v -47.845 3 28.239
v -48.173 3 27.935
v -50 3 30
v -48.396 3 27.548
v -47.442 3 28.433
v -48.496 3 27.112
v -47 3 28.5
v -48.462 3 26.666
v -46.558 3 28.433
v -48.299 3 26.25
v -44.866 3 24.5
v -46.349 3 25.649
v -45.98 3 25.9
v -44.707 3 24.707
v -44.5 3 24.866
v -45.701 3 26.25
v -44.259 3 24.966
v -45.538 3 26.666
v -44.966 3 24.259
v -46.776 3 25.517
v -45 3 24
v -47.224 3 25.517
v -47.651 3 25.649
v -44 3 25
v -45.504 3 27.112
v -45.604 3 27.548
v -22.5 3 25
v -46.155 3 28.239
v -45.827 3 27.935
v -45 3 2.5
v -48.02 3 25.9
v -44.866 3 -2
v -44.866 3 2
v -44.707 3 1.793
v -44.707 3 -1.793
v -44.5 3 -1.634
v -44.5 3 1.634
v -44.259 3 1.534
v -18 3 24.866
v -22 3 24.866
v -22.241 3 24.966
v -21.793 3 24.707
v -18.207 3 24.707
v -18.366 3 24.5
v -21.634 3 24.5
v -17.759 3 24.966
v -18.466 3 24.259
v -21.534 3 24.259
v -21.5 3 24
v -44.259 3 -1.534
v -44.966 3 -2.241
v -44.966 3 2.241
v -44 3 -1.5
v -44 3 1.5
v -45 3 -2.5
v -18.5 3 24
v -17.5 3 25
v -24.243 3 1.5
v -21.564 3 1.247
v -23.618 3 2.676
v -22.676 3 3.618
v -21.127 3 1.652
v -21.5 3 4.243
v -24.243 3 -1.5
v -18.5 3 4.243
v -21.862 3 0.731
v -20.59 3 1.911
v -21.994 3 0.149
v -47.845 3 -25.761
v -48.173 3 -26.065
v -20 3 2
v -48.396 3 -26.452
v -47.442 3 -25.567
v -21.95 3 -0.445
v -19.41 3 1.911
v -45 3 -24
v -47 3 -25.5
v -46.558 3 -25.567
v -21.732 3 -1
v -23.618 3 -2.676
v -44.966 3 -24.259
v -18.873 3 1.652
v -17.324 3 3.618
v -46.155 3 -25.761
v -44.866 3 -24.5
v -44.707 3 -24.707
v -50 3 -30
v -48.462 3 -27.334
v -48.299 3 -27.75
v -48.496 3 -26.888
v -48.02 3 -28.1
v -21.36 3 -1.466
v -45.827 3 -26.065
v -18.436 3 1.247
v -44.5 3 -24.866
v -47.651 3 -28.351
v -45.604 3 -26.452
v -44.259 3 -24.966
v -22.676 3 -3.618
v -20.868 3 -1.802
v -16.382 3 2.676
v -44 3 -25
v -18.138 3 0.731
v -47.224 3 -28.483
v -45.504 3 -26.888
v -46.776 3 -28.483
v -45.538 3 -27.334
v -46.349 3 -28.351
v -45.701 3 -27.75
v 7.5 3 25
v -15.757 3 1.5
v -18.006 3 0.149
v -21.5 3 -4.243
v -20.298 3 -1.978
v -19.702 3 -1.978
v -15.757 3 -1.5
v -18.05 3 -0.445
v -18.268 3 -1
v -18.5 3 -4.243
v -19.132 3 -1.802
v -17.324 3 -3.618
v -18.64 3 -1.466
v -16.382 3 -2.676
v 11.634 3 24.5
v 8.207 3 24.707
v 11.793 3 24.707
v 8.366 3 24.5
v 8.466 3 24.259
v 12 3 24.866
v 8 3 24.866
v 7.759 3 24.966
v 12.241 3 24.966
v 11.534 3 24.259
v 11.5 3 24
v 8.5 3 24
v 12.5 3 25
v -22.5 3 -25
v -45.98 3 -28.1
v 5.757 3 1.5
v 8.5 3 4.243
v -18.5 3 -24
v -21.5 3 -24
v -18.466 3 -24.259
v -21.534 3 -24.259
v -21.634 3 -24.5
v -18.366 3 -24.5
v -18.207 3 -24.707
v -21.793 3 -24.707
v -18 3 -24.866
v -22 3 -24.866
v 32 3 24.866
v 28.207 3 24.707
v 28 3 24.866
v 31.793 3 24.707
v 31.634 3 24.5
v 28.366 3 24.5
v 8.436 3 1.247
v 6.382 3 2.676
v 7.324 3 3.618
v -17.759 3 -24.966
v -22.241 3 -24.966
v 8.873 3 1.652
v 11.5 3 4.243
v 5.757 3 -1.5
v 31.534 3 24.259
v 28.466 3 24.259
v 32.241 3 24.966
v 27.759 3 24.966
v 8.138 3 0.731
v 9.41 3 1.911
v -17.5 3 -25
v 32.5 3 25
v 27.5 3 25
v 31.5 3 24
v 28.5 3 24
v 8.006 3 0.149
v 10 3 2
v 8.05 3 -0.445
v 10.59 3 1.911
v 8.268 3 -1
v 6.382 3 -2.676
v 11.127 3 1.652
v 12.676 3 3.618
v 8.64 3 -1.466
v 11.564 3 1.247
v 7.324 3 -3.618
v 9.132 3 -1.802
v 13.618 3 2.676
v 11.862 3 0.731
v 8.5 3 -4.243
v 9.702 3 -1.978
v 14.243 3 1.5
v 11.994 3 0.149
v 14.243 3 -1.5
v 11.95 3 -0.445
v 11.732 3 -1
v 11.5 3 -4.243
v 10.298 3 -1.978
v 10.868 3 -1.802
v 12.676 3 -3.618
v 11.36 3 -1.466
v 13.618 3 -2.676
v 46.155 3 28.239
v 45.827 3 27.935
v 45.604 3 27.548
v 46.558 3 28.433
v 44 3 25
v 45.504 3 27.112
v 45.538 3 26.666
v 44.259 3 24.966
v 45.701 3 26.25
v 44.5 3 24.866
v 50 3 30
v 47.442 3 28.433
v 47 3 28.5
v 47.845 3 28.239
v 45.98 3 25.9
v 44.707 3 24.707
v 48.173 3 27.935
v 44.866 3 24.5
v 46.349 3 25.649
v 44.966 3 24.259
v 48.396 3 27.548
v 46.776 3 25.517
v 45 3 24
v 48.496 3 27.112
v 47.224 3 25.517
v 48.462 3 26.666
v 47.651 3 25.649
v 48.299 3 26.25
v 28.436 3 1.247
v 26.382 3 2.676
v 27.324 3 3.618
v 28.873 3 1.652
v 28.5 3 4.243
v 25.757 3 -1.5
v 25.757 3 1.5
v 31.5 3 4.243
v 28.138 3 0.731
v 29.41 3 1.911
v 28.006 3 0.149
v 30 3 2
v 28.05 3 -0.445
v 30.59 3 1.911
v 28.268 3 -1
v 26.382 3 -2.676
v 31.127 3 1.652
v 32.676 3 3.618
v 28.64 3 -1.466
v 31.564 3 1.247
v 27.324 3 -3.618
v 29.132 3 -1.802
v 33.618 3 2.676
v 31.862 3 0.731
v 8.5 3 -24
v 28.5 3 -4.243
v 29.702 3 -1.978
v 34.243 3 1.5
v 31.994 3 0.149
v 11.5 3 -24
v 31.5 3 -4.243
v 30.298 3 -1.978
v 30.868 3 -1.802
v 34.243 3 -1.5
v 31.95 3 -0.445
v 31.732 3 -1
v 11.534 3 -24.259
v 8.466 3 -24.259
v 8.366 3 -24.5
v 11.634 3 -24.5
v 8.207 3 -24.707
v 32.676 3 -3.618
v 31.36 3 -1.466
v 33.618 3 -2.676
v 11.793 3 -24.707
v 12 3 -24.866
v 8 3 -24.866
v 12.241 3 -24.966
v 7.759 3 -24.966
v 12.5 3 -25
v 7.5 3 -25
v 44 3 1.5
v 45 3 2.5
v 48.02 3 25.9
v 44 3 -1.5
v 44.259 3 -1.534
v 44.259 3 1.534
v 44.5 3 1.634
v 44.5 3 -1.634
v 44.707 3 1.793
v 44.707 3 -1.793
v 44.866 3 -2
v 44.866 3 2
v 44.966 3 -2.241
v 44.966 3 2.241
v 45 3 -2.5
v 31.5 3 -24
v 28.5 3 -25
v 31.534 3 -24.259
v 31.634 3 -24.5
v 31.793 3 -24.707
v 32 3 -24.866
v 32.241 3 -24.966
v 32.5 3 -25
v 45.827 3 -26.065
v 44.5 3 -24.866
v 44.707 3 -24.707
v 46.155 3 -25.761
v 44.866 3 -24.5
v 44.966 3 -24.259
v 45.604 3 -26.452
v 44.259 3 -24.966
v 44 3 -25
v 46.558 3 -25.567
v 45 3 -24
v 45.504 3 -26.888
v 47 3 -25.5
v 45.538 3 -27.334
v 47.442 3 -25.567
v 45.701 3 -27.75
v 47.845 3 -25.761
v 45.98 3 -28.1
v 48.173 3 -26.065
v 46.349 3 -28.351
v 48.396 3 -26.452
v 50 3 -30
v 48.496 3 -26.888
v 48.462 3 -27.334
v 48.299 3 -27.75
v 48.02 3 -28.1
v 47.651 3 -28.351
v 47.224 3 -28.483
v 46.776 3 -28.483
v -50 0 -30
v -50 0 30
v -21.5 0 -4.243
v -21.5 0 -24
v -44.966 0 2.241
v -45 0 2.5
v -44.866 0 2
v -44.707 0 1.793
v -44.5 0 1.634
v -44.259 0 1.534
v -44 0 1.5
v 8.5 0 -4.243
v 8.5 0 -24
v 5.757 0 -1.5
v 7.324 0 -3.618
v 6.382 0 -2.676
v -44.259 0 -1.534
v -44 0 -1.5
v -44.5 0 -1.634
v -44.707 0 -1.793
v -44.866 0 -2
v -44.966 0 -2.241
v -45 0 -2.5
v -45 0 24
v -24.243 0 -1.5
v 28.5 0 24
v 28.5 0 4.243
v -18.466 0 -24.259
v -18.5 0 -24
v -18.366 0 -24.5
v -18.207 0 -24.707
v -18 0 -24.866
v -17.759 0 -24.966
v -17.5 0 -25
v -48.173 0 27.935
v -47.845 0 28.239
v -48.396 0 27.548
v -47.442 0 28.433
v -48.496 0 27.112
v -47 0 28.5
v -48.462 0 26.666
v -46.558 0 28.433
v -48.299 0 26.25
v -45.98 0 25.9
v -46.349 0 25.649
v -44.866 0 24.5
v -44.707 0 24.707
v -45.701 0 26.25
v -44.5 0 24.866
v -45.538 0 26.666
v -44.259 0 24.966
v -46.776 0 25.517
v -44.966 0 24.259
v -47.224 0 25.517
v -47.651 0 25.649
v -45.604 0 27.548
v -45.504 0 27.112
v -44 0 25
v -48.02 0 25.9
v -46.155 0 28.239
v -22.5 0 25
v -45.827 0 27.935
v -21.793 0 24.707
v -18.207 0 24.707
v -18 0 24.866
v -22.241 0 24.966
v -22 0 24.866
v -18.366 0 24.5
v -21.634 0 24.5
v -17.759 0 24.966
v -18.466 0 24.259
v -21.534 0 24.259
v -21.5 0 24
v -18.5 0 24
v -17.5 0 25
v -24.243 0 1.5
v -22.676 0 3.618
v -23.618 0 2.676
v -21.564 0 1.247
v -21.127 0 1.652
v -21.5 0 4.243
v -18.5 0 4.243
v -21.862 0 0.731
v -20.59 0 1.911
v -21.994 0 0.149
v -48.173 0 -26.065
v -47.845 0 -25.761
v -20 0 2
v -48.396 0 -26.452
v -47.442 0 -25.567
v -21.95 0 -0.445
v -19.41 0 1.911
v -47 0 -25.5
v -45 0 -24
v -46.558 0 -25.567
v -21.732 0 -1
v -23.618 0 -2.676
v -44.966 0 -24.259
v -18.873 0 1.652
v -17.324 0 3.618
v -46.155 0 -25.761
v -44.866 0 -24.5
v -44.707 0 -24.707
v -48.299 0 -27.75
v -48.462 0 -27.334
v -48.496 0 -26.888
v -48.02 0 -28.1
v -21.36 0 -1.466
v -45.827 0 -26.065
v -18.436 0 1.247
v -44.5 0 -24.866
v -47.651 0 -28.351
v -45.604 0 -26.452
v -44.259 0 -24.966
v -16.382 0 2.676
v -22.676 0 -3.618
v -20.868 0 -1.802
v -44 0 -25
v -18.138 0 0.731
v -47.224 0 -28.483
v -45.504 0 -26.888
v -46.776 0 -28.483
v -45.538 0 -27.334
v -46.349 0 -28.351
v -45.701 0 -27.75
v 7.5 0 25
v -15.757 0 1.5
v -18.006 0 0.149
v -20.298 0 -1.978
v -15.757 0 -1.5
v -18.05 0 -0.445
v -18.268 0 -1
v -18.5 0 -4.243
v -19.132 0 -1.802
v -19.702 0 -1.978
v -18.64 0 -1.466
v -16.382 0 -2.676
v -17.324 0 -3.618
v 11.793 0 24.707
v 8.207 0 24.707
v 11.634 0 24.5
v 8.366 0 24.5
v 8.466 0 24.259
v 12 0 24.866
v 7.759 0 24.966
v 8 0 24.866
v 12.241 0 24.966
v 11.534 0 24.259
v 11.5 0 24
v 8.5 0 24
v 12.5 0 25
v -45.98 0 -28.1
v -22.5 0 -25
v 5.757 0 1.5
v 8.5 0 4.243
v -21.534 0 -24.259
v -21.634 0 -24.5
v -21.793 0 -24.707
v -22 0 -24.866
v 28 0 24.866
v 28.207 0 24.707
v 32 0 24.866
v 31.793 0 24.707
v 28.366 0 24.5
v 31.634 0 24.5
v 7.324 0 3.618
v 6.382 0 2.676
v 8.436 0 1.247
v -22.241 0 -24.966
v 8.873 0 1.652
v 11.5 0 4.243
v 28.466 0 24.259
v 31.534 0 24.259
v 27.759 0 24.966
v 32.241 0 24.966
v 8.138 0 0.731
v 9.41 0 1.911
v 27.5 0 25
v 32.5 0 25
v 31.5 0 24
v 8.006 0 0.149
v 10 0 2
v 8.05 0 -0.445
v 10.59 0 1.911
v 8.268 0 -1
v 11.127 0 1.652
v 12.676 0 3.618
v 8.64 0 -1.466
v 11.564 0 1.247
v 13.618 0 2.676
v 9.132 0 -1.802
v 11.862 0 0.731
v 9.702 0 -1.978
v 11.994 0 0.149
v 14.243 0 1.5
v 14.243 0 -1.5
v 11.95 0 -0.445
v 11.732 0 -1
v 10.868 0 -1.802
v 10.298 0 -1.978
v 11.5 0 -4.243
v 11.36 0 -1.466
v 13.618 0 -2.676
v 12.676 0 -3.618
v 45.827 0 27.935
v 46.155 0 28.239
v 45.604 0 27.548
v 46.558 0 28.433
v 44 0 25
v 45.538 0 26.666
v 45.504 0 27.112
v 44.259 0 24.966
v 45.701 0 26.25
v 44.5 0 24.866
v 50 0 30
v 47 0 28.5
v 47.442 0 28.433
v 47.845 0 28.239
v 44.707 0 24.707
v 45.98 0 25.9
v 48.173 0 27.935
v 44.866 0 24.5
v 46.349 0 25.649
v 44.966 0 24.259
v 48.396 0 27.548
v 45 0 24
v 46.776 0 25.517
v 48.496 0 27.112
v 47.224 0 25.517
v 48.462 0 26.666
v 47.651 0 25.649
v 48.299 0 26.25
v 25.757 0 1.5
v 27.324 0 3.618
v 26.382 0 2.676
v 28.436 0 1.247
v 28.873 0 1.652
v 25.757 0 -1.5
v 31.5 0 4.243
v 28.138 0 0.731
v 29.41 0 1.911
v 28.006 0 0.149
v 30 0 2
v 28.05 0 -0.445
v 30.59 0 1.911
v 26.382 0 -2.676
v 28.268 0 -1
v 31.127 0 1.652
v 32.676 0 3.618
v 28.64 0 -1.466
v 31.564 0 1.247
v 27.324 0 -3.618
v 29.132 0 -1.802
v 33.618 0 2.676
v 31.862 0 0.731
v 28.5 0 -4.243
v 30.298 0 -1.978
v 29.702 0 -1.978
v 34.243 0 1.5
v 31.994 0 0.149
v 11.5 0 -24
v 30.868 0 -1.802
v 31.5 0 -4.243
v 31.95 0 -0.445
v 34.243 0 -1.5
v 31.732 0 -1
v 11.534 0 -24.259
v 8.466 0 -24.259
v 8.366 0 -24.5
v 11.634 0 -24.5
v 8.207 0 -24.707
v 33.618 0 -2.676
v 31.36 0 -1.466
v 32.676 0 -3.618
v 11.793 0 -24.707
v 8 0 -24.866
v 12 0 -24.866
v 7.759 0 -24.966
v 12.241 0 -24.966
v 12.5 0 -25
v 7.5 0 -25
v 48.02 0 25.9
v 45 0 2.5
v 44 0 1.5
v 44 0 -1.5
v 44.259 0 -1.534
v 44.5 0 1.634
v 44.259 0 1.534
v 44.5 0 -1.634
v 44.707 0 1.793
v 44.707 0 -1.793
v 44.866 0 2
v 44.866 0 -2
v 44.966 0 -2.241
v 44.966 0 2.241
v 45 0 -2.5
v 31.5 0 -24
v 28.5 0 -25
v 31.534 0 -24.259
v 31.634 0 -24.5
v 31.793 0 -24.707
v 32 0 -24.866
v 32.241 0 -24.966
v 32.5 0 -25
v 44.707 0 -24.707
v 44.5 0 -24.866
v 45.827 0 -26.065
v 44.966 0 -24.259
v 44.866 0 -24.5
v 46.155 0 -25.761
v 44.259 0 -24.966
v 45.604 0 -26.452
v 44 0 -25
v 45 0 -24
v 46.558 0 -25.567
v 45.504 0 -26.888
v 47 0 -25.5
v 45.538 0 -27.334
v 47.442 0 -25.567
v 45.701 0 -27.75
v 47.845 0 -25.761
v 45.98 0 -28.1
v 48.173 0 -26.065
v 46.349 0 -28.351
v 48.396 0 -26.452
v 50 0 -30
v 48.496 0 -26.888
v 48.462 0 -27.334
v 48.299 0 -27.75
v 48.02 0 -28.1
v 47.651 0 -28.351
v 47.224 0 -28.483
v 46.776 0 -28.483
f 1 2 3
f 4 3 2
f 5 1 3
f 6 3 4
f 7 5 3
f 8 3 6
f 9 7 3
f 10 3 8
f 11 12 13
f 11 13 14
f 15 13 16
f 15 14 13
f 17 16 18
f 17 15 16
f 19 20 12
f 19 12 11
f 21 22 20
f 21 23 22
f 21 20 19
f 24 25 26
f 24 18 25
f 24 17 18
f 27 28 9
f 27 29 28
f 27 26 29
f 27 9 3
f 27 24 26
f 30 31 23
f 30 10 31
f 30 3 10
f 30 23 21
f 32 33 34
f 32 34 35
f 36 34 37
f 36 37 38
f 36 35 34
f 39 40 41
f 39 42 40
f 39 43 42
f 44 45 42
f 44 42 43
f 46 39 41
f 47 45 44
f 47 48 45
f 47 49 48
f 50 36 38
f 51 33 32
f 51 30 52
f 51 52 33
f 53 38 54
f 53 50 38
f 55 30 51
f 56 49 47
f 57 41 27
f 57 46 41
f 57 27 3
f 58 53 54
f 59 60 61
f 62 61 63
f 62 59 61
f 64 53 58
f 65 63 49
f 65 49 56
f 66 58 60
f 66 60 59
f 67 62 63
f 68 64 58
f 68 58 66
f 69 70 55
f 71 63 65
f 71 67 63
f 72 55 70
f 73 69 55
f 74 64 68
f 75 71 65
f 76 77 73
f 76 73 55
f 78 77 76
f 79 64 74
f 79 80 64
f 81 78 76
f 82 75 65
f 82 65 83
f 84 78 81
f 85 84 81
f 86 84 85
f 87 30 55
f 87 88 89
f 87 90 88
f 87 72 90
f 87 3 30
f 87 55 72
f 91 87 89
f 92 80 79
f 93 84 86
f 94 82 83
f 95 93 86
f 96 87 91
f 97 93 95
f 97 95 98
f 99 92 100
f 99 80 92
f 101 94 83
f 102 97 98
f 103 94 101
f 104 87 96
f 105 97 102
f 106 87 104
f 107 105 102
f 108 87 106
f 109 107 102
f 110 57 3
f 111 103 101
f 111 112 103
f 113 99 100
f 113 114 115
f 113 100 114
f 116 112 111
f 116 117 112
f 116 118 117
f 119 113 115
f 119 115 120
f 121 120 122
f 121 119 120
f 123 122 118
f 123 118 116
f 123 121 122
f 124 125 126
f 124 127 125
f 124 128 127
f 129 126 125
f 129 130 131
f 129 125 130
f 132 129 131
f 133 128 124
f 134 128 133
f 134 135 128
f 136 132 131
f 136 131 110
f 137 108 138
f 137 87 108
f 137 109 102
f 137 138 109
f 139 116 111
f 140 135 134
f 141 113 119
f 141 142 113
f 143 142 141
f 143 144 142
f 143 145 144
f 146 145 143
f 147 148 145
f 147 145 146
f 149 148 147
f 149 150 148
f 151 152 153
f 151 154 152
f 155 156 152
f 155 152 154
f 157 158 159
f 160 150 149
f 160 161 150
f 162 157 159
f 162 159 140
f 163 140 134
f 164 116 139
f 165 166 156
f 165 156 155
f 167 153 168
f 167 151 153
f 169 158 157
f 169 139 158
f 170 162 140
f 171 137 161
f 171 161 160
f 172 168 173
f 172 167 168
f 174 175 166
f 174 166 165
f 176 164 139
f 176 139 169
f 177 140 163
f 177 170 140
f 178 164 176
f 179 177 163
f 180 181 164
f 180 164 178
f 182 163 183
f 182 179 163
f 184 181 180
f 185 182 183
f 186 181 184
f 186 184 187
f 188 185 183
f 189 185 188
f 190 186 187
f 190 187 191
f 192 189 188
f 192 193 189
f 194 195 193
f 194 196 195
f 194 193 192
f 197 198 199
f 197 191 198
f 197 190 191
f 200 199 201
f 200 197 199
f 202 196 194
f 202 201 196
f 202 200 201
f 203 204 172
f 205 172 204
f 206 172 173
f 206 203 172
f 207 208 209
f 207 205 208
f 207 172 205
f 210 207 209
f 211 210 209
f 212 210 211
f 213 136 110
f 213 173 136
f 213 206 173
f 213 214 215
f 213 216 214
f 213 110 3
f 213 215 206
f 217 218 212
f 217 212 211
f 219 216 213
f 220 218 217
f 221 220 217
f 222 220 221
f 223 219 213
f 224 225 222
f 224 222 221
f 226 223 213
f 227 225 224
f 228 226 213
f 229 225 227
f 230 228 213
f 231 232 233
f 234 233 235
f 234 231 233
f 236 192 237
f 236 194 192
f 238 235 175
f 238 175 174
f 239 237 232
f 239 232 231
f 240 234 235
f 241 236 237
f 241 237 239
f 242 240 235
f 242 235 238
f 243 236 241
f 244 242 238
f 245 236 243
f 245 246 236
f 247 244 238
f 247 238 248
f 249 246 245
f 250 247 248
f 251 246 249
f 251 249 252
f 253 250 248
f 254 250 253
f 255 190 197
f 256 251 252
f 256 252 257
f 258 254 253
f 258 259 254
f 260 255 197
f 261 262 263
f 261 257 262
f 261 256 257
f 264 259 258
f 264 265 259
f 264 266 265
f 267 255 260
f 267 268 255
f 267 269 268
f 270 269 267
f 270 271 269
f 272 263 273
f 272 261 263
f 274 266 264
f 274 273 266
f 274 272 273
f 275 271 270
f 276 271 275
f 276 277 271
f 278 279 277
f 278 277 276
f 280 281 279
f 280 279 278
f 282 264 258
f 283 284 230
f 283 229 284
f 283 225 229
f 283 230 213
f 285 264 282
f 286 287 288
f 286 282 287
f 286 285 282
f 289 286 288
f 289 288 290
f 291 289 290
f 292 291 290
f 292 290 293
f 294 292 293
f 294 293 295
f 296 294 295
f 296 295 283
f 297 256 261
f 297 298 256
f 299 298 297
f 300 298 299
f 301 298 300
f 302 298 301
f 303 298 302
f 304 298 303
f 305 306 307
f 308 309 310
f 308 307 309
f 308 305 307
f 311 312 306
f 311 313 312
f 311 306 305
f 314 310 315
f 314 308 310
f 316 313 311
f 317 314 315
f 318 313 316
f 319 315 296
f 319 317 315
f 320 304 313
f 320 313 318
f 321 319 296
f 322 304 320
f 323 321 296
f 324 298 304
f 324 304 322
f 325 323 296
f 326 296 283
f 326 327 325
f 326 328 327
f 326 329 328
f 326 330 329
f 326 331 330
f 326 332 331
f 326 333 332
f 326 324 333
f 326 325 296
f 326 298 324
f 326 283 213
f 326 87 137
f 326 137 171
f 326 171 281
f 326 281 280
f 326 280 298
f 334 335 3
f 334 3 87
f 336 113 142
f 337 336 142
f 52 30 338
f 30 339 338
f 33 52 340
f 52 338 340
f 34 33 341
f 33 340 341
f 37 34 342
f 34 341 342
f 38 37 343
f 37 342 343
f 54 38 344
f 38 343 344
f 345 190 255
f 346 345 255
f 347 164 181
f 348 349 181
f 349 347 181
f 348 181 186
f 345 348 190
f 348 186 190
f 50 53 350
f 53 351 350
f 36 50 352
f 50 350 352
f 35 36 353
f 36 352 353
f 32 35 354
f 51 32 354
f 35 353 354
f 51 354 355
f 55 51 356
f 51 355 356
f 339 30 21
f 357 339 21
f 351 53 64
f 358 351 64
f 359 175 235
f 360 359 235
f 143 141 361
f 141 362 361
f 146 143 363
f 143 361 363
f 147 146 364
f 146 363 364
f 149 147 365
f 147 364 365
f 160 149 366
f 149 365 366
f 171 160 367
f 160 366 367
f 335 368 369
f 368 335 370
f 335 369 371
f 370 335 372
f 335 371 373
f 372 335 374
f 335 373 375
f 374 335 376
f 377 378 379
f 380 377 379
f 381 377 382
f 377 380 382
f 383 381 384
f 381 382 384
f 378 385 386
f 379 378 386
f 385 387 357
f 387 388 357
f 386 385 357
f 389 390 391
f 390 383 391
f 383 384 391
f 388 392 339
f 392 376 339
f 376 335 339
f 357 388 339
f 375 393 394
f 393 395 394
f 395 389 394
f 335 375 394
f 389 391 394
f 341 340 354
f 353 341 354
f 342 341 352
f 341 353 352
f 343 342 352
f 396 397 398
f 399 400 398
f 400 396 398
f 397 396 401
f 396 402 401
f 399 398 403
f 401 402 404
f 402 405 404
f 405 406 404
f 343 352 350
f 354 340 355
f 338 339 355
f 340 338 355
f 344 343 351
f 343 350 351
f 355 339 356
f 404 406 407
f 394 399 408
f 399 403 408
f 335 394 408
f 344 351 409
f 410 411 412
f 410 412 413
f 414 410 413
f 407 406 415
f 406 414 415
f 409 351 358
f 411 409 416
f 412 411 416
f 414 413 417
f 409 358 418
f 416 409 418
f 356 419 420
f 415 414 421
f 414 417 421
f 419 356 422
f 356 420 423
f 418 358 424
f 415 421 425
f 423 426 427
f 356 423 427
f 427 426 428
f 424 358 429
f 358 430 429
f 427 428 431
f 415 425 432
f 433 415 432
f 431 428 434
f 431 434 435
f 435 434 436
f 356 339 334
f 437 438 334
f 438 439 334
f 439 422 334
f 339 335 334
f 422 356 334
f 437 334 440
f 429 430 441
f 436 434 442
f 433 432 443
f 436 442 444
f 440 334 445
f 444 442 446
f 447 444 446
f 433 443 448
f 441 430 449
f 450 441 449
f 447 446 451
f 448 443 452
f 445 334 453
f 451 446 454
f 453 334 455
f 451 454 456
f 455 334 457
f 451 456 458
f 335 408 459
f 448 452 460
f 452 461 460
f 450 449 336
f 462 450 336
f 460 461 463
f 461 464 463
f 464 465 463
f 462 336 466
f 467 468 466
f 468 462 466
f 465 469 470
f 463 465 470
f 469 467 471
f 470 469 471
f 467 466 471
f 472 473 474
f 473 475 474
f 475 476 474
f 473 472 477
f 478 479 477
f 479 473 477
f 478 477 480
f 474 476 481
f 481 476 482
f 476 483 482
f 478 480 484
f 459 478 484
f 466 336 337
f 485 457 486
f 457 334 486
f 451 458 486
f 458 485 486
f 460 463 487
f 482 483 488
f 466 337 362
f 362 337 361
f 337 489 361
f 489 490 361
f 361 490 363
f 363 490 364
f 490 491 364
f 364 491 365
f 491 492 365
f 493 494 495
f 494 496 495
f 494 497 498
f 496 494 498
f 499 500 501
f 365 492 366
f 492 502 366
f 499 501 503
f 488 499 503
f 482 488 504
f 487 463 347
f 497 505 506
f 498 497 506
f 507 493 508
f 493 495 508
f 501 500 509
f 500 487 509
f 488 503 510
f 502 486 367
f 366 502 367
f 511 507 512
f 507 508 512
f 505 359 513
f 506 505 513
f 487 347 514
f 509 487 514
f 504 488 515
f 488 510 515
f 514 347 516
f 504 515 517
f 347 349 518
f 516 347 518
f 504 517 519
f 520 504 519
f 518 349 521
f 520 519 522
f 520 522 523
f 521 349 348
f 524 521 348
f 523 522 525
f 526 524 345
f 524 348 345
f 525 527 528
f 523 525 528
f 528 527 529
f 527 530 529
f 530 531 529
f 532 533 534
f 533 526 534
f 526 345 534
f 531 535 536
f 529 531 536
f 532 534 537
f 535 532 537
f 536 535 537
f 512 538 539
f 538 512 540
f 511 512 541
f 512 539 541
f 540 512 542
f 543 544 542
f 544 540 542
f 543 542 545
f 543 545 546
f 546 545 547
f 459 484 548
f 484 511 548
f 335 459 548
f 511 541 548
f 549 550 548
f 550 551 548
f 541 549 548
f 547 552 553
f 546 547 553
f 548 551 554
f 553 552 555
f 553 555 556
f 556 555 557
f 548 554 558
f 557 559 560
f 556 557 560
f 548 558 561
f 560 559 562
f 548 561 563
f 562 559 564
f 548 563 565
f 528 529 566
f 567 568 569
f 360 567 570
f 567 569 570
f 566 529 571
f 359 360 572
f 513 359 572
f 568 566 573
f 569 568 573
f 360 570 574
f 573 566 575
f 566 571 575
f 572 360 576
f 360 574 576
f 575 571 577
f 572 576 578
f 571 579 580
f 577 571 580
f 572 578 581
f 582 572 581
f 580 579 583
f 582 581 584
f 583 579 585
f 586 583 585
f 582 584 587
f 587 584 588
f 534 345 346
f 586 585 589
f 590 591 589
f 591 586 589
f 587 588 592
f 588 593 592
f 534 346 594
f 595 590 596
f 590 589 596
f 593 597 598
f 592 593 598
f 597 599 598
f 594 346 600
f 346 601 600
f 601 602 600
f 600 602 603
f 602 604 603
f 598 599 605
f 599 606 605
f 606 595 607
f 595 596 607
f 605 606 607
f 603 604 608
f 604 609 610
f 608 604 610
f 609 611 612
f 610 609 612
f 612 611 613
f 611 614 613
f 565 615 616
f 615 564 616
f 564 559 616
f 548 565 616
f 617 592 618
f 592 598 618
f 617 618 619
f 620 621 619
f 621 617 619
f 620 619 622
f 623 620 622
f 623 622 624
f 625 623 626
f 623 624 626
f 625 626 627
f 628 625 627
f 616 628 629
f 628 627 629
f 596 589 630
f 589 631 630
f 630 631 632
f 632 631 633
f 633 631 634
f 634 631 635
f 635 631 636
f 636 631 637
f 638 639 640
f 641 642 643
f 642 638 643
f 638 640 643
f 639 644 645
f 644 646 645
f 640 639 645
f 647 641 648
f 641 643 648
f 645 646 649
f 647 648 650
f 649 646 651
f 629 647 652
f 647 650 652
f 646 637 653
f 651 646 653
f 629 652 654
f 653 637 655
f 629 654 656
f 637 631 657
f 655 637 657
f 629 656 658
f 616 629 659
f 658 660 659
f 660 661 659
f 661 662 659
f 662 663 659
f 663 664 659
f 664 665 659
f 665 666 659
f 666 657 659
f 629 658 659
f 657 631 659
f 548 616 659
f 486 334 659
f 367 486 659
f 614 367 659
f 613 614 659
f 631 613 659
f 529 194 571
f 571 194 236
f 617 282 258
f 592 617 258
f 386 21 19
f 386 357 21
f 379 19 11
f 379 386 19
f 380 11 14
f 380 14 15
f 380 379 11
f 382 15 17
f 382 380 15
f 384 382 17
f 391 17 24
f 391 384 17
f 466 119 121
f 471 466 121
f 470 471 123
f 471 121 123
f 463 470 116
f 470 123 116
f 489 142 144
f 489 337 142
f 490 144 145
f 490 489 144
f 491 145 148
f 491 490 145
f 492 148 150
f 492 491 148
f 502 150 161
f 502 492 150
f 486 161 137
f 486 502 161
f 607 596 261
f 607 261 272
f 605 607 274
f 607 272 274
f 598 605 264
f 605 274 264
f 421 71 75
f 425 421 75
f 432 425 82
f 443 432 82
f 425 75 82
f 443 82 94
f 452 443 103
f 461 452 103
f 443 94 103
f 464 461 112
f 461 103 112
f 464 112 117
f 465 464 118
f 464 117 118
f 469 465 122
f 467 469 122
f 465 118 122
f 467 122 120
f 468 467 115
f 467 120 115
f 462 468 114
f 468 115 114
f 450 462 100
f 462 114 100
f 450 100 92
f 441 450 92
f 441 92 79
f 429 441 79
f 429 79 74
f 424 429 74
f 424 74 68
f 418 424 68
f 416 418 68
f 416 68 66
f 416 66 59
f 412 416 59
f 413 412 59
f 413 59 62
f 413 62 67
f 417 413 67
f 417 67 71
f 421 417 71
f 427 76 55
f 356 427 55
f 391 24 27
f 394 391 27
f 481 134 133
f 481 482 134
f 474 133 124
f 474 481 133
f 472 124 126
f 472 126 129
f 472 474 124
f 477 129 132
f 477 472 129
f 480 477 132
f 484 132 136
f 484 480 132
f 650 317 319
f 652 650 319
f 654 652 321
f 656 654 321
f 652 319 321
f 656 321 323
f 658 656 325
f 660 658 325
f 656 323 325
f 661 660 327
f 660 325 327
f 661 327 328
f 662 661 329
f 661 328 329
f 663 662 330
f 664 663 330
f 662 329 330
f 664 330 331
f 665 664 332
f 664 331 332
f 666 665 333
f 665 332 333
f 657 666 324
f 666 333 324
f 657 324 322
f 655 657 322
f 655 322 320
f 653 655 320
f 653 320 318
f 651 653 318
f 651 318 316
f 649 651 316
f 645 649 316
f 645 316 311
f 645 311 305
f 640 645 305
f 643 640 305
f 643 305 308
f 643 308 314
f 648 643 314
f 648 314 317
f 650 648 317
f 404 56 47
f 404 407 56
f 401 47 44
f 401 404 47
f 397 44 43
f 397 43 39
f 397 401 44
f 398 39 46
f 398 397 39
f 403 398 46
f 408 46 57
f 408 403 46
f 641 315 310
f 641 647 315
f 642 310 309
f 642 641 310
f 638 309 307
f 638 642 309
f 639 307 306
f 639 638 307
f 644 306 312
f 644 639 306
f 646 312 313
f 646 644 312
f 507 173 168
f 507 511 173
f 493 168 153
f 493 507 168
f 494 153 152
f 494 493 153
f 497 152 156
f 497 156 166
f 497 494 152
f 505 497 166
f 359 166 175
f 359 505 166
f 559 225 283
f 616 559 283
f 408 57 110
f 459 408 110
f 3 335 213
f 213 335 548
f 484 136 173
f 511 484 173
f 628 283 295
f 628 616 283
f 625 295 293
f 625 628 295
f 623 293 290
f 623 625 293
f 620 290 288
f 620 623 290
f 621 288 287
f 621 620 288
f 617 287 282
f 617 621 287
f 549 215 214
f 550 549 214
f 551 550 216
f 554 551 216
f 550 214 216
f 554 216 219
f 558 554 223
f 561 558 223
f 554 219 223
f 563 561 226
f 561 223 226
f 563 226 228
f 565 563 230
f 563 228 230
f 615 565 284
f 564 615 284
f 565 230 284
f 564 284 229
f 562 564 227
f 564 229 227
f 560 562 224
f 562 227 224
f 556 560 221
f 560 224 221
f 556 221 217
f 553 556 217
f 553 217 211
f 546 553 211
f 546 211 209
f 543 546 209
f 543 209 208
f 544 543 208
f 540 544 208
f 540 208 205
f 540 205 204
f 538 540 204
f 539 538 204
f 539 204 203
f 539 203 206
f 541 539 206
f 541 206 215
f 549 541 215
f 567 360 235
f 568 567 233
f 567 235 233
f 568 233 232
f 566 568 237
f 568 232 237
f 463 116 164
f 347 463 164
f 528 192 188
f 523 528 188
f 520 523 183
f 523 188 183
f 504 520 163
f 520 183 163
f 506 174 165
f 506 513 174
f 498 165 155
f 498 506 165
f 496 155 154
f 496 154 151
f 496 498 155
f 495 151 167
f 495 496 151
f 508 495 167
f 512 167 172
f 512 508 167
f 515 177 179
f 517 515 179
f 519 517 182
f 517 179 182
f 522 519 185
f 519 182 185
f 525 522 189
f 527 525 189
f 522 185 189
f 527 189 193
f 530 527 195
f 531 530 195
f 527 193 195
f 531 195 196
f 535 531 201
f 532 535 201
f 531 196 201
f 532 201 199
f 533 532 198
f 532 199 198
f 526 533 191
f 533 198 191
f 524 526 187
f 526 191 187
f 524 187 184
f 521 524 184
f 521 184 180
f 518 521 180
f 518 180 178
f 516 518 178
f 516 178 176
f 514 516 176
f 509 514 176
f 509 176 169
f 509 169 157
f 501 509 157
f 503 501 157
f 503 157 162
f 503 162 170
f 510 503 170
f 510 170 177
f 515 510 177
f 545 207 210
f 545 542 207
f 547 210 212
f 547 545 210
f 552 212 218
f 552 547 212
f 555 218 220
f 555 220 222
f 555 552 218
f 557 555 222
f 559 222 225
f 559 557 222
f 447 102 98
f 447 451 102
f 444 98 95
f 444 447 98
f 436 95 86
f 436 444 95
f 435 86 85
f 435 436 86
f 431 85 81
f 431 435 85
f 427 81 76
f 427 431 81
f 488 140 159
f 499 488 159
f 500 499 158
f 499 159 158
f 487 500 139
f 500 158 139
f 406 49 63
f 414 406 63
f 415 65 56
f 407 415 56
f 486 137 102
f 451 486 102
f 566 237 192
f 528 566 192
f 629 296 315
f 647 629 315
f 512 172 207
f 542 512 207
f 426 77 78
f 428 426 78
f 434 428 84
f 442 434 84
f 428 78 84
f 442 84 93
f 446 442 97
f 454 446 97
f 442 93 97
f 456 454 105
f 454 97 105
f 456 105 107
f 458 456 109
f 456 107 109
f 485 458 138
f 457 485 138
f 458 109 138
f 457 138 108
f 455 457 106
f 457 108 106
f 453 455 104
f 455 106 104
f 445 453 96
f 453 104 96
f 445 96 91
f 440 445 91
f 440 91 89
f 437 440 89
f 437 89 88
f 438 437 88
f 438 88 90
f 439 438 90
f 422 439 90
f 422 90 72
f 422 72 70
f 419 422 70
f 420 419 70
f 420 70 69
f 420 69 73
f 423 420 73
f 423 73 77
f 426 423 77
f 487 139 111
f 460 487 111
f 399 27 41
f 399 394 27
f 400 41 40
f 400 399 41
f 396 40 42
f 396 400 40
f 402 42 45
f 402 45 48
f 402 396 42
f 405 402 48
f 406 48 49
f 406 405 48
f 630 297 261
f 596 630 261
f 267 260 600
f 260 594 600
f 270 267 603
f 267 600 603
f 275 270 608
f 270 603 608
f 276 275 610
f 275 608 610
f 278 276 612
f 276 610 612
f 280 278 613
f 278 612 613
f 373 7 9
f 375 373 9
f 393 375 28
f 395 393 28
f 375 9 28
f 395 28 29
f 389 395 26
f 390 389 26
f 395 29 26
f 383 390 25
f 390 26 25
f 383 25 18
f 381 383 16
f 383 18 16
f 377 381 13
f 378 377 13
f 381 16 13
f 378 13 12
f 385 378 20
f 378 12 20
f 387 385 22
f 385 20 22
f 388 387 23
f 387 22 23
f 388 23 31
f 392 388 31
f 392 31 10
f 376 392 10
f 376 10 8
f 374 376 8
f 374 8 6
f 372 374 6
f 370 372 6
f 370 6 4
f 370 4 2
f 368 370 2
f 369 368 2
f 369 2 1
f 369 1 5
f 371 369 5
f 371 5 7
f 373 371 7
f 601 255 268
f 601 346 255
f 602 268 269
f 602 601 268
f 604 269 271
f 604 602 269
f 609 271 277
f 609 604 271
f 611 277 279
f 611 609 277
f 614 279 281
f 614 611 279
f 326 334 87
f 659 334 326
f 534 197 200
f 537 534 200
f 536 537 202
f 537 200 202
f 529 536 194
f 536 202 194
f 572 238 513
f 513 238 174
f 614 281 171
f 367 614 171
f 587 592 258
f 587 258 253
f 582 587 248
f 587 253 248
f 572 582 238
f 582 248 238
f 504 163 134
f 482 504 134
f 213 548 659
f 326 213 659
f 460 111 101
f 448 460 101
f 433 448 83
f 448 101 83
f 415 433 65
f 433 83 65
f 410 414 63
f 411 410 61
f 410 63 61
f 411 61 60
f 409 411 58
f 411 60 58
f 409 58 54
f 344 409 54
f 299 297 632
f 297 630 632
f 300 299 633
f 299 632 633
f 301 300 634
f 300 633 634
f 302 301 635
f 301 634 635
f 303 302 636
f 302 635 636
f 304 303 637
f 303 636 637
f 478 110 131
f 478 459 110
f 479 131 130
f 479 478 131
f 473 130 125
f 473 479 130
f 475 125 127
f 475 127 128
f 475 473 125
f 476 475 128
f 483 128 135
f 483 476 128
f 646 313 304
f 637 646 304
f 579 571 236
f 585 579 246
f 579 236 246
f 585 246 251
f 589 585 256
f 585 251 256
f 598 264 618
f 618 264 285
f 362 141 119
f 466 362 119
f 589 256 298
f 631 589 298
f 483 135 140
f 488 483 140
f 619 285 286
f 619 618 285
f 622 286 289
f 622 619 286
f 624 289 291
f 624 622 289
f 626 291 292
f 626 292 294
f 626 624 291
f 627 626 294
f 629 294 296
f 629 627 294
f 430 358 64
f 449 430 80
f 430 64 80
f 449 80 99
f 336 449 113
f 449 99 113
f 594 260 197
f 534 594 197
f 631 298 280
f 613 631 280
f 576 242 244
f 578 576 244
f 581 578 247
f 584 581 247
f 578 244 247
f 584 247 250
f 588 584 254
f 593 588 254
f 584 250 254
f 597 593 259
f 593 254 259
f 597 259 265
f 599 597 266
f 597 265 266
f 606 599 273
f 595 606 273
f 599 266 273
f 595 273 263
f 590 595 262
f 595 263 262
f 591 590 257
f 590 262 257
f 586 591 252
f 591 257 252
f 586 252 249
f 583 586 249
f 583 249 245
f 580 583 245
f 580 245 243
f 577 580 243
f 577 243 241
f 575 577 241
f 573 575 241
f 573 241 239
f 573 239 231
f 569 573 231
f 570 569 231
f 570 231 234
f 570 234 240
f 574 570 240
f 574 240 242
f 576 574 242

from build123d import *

# Parameters (mm, degrees)
SKETCH1_W           = 100
SKETCH1_H           = 60
BOSS_EXTRUDE1_DEPTH = 3
SKETCH2_R           = 2
SKETCH2_R_2         = 1.5
CUT_EXTRUDE1_DEPTH  = 59.386642308
FILLET1_R           = 1


with BuildPart() as part:
    # Sketch1 → Boss-Extrude1 (new body)
    with BuildSketch(Plane(origin=(0, 0, 0), x_dir=(1, 0, 0), z_dir=(0, 1, 0))):
        Rectangle(SKETCH1_W, SKETCH1_H)
    extrude(amount=BOSS_EXTRUDE1_DEPTH)

    # Sketch2 → Cut-Extrude1 (cut, through all)
    with BuildSketch(Plane(origin=(0, 3, 0), x_dir=(1, 0, 0), z_dir=(0, 1, 0))):
        with BuildLine():
            Line((-45, 1.5), (-24.242640687, 1.5))
            ThreePointArc((-24.242640687, 1.5), (-23.181980515, 3.181980515), (-21.5, 4.242640687))
            Line((-21.5, 4.242640687), (-21.5, 25))
            Line((-21.5, 25), (-45, 25))
            Line((-45, 25), (-45, 1.5))
        make_face()
        with BuildLine():
            Line((-45, -1.5), (-45, -25))
            Line((-45, -25), (-21.5, -25))
            Line((-21.5, -25), (-21.5, -4.242640687))
            ThreePointArc((-21.5, -4.242640687), (-23.181980515, -3.181980515), (-24.242640687, -1.5))
            Line((-24.242640687, -1.5), (-45, -1.5))
        make_face()
        with BuildLine():
            Line((-18.5, 25), (-18.5, 4.242640687))
            ThreePointArc((-18.5, 4.242640687), (-16.818019485, 3.181980515), (-15.757359313, 1.5))
            Line((-15.757359313, 1.5), (5.757359313, 1.5))
            ThreePointArc((5.757359313, 1.5), (6.818019485, 3.181980515), (8.5, 4.242640687))
            Line((8.5, 4.242640687), (8.5, 25))
            Line((8.5, 25), (-18.5, 25))
        make_face()
        with BuildLine():
            ThreePointArc((-15.757359313, -1.5), (-16.818019485, -3.181980515), (-18.5, -4.242640687))
            Line((-18.5, -4.242640687), (-18.5, -25))
            Line((-18.5, -25), (8.5, -25))
            Line((8.5, -25), (8.5, -4.242640687))
            ThreePointArc((8.5, -4.242640687), (6.818019485, -3.181980515), (5.757359313, -1.5))
            Line((5.757359313, -1.5), (-15.757359313, -1.5))
        make_face()
        with BuildLine():
            ThreePointArc((14.242640687, -1.5), (13.181980515, -3.181980515), (11.5, -4.242640687))
            Line((11.5, -4.242640687), (11.5, -25))
            Line((11.5, -25), (28.5, -25))
            Line((28.5, -25), (28.5, -4.242640687))
            ThreePointArc((28.5, -4.242640687), (26.818019485, -3.181980515), (25.757359313, -1.5))
            Line((25.757359313, -1.5), (14.242640687, -1.5))
        make_face()
        with BuildLine():
            Line((11.5, 25), (11.5, 4.242640687))
            ThreePointArc((11.5, 4.242640687), (13.181980515, 3.181980515), (14.242640687, 1.5))
            Line((14.242640687, 1.5), (25.757359313, 1.5))
            ThreePointArc((25.757359313, 1.5), (26.818019485, 3.181980515), (28.5, 4.242640687))
            Line((28.5, 4.242640687), (28.5, 25))
            Line((28.5, 25), (11.5, 25))
        make_face()
        with BuildLine():
            Line((31.5, 25), (31.5, 4.242640687))
            ThreePointArc((31.5, 4.242640687), (33.181980515, 3.181980515), (34.242640687, 1.5))
            Line((34.242640687, 1.5), (45, 1.5))
            Line((45, 1.5), (45, 25))
            Line((45, 25), (31.5, 25))
        make_face()
        with BuildLine():
            ThreePointArc((34.242640687, -1.5), (33.181980515, -3.181980515), (31.5, -4.242640687))
            Line((31.5, -4.242640687), (31.5, -25))
            Line((31.5, -25), (45, -25))
            Line((45, -25), (45, -1.5))
            Line((45, -1.5), (34.242640687, -1.5))
        make_face()
        with Locations(Location((30, 0, 0), (0, 0, 270))):
            Circle(SKETCH2_R)
        with Locations(Location((10, 0, 0), (0, 0, 270))):
            Circle(SKETCH2_R)
        with Locations(Location((-20, 0, 0), (0, 0, 270))):
            Circle(SKETCH2_R)
        with Locations(Location((-47, -27, 0), (0, 0, 270))):
            Circle(SKETCH2_R_2)
        with Locations(Location((-47, 27, 0), (0, 0, 270))):
            Circle(SKETCH2_R_2)
        with Locations(Location((47, -27, 0), (0, 0, 270))):
            Circle(SKETCH2_R_2)
        with Locations(Location((47, 27, 0), (0, 0, 270))):
            Circle(SKETCH2_R_2)
    extrude(amount=-CUT_EXTRUDE1_DEPTH, mode=Mode.SUBTRACT)

    # Fillet1
    fillet1_edges = [part.edges().sort_by_distance(p)[0] for p in [
        (8.5, 1.5, 25),
        (-18.5, 1.5, 25),
        (28.5, 1.5, 25),
        (11.5, 1.5, 25),
        (-45, 1.5, -1.5),
        (-45, 1.5, -25),
        (-21.5, 1.5, -25),
        (11.5, 1.5, -25),
        (31.5, 1.5, -25),
        (45, 1.5, -25),
        (45, 1.5, -1.5),
        (45, 1.5, 1.5),
        (45, 1.5, 25),
        (31.5, 1.5, 25),
        (-21.5, 1.5, 25),
        (-45, 1.5, 25),
        (-45, 1.5, 1.5),
        (-18.5, 1.5, -25),
        (8.5, 1.5, -25),
    ]]
    fillet(fillet1_edges, radius=FILLET1_R)


solid = part.part
